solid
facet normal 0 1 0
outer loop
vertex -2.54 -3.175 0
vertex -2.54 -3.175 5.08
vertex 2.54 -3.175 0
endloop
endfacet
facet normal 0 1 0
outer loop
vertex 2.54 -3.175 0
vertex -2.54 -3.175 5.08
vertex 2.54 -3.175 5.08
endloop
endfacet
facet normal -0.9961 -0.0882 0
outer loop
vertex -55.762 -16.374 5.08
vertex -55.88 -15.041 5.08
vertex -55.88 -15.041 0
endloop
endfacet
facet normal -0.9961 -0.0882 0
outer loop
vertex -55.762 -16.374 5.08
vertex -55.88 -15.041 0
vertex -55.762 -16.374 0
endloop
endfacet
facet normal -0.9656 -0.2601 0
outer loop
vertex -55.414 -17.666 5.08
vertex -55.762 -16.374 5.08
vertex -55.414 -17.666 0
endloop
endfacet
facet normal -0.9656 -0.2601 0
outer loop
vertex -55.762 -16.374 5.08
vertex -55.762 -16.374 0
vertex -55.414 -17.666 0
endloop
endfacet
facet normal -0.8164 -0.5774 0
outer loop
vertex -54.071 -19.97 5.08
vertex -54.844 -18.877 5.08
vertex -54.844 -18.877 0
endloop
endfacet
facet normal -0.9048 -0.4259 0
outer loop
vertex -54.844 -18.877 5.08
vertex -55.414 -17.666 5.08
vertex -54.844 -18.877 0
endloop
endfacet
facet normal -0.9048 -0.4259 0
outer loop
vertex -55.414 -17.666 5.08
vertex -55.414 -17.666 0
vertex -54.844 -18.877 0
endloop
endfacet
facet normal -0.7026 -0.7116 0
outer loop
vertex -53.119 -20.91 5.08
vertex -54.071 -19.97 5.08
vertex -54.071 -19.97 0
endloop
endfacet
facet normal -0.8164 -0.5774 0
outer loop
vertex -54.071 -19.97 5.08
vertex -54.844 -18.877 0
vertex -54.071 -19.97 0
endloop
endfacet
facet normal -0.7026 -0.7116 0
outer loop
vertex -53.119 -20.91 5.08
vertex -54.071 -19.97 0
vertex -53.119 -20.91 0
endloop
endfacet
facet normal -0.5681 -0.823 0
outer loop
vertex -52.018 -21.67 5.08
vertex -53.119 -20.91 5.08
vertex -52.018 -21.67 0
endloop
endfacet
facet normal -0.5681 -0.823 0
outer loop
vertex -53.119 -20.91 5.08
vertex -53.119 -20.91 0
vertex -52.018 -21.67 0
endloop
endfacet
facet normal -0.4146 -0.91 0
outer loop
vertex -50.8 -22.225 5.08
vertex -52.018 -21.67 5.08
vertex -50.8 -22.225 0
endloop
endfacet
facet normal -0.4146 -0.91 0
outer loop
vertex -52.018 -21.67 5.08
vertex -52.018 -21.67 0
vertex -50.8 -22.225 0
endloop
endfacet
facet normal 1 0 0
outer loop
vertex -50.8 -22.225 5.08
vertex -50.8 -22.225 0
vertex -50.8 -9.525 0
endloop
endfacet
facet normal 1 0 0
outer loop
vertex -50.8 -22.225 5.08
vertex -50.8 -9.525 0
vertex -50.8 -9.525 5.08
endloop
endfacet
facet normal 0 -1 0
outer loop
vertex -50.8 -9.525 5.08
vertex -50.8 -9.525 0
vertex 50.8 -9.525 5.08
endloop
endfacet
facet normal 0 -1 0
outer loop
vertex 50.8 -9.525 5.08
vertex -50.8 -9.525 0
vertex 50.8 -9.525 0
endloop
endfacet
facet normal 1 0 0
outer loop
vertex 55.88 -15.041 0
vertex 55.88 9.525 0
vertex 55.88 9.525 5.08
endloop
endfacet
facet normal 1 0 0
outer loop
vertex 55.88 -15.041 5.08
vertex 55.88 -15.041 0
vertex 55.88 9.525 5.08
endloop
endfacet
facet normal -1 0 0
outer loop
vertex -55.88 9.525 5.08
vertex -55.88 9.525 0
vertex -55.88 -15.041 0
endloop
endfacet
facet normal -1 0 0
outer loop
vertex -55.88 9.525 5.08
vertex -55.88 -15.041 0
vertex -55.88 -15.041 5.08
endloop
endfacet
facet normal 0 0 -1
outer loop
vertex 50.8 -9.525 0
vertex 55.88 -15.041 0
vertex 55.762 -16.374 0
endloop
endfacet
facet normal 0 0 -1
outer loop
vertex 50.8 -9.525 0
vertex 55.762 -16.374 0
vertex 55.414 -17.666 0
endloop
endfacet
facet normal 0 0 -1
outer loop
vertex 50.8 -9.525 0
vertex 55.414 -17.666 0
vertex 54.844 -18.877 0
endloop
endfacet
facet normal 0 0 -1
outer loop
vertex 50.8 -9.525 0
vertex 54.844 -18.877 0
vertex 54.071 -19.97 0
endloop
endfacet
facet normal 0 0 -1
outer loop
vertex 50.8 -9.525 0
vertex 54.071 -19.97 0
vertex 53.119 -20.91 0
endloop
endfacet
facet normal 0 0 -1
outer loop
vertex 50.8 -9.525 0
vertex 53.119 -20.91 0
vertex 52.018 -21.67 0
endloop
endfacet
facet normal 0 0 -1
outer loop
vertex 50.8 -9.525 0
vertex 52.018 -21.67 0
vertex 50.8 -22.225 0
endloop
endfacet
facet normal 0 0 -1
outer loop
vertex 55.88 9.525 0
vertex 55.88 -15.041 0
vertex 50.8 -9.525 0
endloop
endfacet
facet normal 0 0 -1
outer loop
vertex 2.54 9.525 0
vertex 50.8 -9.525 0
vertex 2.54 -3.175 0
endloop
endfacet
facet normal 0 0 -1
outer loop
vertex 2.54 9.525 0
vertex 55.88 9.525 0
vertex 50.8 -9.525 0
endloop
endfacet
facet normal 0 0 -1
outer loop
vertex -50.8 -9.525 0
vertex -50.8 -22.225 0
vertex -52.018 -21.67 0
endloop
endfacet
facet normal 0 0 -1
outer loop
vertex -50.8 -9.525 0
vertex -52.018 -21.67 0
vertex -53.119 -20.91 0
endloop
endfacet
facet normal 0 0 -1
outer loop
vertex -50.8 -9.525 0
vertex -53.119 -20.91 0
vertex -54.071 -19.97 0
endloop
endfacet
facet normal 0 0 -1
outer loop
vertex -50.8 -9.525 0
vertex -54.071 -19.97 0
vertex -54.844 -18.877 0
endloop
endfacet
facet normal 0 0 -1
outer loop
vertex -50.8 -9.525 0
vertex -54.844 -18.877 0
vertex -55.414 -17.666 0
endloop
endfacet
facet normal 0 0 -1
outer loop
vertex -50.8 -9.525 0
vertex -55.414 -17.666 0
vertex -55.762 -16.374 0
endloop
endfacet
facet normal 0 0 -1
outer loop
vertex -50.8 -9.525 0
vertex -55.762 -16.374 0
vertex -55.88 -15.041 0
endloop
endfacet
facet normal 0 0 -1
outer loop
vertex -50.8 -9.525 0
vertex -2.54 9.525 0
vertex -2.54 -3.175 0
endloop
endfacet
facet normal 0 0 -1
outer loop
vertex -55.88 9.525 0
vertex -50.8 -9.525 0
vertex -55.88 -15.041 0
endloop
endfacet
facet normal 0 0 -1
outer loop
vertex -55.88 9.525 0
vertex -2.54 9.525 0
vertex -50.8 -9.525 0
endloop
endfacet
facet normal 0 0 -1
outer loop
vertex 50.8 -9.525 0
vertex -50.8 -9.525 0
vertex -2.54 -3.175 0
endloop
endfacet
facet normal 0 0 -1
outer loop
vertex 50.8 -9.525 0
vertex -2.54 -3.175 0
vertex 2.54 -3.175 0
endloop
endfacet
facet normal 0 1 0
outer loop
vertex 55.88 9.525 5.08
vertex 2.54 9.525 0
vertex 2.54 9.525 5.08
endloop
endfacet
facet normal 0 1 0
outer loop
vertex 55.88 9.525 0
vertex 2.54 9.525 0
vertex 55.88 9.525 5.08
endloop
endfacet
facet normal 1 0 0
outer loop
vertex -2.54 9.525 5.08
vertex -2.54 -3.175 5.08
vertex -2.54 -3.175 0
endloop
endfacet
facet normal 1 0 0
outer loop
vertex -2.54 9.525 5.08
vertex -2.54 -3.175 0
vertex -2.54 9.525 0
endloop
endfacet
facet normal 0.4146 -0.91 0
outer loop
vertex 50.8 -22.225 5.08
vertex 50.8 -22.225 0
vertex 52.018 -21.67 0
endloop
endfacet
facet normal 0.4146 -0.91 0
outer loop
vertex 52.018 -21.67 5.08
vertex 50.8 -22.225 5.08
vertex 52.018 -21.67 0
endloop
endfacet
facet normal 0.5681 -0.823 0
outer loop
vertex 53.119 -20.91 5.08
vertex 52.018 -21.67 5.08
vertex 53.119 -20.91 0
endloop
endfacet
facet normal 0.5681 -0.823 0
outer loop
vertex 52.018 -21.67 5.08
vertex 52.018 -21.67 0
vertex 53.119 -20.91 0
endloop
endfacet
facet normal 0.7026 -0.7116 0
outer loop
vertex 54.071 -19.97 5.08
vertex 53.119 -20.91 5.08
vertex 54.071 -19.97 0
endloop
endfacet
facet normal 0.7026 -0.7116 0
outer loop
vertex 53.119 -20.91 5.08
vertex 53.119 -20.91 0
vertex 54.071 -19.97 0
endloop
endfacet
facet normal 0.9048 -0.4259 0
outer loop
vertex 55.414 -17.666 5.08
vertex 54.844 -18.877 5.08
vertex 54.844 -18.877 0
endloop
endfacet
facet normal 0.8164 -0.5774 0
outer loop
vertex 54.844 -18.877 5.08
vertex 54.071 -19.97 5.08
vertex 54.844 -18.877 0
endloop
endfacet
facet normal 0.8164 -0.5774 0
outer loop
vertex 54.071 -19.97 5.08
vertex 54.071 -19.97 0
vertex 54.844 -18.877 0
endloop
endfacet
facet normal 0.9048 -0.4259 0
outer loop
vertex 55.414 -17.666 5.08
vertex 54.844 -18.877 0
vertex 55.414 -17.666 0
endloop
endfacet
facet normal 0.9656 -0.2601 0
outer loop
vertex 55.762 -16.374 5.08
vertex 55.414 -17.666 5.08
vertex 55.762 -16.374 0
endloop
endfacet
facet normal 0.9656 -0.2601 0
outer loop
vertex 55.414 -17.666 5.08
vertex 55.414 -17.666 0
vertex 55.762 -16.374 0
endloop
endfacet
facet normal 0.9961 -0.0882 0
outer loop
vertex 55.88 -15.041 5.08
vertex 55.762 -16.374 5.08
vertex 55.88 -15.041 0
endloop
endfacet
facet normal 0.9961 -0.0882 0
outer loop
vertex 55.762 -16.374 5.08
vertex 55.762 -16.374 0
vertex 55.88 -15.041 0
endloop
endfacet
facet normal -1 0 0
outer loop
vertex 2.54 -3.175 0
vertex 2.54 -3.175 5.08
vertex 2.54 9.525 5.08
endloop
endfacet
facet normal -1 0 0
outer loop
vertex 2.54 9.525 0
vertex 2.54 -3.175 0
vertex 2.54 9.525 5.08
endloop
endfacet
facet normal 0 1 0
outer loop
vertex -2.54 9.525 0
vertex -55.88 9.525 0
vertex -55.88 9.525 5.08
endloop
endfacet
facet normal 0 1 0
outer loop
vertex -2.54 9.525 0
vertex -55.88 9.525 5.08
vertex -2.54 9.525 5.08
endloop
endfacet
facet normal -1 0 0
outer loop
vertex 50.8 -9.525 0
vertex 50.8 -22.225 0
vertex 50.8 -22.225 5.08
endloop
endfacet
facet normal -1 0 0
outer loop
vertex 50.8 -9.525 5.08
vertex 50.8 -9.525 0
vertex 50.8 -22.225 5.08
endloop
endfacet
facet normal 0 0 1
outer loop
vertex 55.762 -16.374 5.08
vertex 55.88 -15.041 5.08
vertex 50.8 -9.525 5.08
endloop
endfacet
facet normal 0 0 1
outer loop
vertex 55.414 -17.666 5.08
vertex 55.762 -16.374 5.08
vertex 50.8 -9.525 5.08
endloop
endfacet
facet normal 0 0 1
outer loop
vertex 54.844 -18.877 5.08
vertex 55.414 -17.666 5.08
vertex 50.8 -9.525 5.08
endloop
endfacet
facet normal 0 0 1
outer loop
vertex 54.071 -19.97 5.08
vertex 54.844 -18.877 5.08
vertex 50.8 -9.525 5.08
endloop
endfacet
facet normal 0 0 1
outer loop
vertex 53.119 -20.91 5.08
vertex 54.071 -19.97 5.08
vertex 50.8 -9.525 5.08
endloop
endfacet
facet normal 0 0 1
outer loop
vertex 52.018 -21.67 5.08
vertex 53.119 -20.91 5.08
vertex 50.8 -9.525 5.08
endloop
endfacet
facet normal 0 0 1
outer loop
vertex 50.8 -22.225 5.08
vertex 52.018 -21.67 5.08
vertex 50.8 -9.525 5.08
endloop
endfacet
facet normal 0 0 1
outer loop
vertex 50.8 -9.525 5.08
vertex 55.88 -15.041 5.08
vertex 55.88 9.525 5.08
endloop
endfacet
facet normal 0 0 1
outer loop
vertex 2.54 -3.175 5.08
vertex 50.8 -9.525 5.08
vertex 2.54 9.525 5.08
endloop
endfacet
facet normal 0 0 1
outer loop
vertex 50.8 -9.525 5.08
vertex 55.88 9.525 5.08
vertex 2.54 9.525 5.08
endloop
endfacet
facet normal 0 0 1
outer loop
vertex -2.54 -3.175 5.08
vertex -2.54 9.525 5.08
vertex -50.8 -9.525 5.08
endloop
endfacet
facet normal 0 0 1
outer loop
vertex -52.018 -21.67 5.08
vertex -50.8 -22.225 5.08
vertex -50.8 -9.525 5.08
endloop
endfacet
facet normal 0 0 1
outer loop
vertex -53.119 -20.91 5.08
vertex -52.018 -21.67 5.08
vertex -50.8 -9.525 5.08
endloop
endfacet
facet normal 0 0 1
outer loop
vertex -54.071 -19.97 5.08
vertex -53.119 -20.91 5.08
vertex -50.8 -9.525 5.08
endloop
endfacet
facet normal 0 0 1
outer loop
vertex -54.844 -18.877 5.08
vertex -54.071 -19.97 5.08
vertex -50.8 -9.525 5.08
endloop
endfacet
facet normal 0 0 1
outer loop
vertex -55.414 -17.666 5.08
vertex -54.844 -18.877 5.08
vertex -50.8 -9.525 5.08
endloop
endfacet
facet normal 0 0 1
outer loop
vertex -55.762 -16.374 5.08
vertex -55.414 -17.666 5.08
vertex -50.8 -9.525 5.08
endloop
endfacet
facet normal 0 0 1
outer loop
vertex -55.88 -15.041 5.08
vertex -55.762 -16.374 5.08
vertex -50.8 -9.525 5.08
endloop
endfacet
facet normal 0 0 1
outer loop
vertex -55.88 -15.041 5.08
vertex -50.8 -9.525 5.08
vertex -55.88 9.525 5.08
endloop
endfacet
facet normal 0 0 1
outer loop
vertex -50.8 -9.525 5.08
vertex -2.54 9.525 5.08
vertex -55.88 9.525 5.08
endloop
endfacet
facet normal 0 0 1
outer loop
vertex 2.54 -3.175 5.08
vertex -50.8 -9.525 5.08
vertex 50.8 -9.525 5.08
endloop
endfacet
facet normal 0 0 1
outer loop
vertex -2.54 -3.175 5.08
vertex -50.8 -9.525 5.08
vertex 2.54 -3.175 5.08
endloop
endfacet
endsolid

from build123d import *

# Parameters (mm, degrees)
SKETCH1_W           = 111.76
SKETCH1_H           = 19.05
BOSS_EXTRUDE1_DEPTH = 5.08
SKETCH5_W           = 5.08
SKETCH5_H           = 5.08
BOSS_EXTRUDE3_DEPTH = 12.7
FILLET2_R           = 7.62
SKETCH7_W           = 5.08
SKETCH7_H           = 12.7
CUT_EXTRUDE2_DEPTH  = 61.35173092


with BuildPart() as part:
    # Sketch1 → Boss-Extrude1 (new body)
    with BuildSketch(Plane.XY):
        Rectangle(SKETCH1_W, SKETCH1_H)
    extrude(amount=BOSS_EXTRUDE1_DEPTH)

    # Sketch5 → Boss-Extrude3 (add)
    with BuildSketch(Plane.XZ.offset(9.525)):
        with Locations((-53.34, 2.54)):
            Rectangle(SKETCH5_W, SKETCH5_H)
    boss_extrude3 = extrude(amount=BOSS_EXTRUDE3_DEPTH)

    # Mirror1: Boss-Extrude3 across plane
    add(boss_extrude3.mirror(Plane(origin=(0, 0, 0), x_dir=(0, 0, 1), z_dir=(1, 0, 0))))

    # Fillet2
    # the kernel refuses this fillet: 7.62 mm, written as the material it takes off along each edge
    with BuildSketch(Plane(origin=(-55.88, -22.225, -17.960512242), x_dir=(1, 0, 0), z_dir=(0, 0, 1))) as fillet2_piece_1:
        with BuildLine():
            CenterArc((7.62, 7.184204897), FILLET2_R, 180, 70.528779366)
            Line((0, 7.184204897), (-0.1524, 7.184204897))
            Line((-0.1524, 7.184204897), (-0.1524, 0))
            Line((-0.1524, 0), (0, -0.1524))
            ThreePointArc((0, -0.1524), (2.54, -0.1524), (5.0292, -0.143684098))
            Line((5.0292, -0.143684098), (5.08, 0))
        make_face()
    extrude(amount=41.001024484, mode=Mode.SUBTRACT)
    with BuildSketch(Plane(origin=(55.88, -22.225, -17.960512242), x_dir=(0, 1, 0), z_dir=(0, 0, 1))) as fillet2_piece_2:
        with BuildLine():
            CenterArc((7.184204897, 7.62), FILLET2_R, 199.471220634, 70.528779366)
            Line((0, 5.08), (-0.143684098, 5.0292))
            ThreePointArc((-0.143684098, 5.0292), (-0.1524, 2.54), (-0.1524, 0))
            Line((-0.1524, 0), (0, -0.1524))
            Line((0, -0.1524), (7.184204897, -0.1524))
            Line((7.184204897, -0.1524), (7.184204897, 0))
        make_face()
    extrude(amount=41.001024484, mode=Mode.SUBTRACT)

    # Sketch7 → Cut-Extrude2 (cut, through all)
    with BuildSketch(Plane.XY.offset(5.08)):
        with Locations((0, 3.175)):
            Rectangle(SKETCH7_W, SKETCH7_H)
    extrude(amount=-CUT_EXTRUDE2_DEPTH, mode=Mode.SUBTRACT)


solid = part.part
